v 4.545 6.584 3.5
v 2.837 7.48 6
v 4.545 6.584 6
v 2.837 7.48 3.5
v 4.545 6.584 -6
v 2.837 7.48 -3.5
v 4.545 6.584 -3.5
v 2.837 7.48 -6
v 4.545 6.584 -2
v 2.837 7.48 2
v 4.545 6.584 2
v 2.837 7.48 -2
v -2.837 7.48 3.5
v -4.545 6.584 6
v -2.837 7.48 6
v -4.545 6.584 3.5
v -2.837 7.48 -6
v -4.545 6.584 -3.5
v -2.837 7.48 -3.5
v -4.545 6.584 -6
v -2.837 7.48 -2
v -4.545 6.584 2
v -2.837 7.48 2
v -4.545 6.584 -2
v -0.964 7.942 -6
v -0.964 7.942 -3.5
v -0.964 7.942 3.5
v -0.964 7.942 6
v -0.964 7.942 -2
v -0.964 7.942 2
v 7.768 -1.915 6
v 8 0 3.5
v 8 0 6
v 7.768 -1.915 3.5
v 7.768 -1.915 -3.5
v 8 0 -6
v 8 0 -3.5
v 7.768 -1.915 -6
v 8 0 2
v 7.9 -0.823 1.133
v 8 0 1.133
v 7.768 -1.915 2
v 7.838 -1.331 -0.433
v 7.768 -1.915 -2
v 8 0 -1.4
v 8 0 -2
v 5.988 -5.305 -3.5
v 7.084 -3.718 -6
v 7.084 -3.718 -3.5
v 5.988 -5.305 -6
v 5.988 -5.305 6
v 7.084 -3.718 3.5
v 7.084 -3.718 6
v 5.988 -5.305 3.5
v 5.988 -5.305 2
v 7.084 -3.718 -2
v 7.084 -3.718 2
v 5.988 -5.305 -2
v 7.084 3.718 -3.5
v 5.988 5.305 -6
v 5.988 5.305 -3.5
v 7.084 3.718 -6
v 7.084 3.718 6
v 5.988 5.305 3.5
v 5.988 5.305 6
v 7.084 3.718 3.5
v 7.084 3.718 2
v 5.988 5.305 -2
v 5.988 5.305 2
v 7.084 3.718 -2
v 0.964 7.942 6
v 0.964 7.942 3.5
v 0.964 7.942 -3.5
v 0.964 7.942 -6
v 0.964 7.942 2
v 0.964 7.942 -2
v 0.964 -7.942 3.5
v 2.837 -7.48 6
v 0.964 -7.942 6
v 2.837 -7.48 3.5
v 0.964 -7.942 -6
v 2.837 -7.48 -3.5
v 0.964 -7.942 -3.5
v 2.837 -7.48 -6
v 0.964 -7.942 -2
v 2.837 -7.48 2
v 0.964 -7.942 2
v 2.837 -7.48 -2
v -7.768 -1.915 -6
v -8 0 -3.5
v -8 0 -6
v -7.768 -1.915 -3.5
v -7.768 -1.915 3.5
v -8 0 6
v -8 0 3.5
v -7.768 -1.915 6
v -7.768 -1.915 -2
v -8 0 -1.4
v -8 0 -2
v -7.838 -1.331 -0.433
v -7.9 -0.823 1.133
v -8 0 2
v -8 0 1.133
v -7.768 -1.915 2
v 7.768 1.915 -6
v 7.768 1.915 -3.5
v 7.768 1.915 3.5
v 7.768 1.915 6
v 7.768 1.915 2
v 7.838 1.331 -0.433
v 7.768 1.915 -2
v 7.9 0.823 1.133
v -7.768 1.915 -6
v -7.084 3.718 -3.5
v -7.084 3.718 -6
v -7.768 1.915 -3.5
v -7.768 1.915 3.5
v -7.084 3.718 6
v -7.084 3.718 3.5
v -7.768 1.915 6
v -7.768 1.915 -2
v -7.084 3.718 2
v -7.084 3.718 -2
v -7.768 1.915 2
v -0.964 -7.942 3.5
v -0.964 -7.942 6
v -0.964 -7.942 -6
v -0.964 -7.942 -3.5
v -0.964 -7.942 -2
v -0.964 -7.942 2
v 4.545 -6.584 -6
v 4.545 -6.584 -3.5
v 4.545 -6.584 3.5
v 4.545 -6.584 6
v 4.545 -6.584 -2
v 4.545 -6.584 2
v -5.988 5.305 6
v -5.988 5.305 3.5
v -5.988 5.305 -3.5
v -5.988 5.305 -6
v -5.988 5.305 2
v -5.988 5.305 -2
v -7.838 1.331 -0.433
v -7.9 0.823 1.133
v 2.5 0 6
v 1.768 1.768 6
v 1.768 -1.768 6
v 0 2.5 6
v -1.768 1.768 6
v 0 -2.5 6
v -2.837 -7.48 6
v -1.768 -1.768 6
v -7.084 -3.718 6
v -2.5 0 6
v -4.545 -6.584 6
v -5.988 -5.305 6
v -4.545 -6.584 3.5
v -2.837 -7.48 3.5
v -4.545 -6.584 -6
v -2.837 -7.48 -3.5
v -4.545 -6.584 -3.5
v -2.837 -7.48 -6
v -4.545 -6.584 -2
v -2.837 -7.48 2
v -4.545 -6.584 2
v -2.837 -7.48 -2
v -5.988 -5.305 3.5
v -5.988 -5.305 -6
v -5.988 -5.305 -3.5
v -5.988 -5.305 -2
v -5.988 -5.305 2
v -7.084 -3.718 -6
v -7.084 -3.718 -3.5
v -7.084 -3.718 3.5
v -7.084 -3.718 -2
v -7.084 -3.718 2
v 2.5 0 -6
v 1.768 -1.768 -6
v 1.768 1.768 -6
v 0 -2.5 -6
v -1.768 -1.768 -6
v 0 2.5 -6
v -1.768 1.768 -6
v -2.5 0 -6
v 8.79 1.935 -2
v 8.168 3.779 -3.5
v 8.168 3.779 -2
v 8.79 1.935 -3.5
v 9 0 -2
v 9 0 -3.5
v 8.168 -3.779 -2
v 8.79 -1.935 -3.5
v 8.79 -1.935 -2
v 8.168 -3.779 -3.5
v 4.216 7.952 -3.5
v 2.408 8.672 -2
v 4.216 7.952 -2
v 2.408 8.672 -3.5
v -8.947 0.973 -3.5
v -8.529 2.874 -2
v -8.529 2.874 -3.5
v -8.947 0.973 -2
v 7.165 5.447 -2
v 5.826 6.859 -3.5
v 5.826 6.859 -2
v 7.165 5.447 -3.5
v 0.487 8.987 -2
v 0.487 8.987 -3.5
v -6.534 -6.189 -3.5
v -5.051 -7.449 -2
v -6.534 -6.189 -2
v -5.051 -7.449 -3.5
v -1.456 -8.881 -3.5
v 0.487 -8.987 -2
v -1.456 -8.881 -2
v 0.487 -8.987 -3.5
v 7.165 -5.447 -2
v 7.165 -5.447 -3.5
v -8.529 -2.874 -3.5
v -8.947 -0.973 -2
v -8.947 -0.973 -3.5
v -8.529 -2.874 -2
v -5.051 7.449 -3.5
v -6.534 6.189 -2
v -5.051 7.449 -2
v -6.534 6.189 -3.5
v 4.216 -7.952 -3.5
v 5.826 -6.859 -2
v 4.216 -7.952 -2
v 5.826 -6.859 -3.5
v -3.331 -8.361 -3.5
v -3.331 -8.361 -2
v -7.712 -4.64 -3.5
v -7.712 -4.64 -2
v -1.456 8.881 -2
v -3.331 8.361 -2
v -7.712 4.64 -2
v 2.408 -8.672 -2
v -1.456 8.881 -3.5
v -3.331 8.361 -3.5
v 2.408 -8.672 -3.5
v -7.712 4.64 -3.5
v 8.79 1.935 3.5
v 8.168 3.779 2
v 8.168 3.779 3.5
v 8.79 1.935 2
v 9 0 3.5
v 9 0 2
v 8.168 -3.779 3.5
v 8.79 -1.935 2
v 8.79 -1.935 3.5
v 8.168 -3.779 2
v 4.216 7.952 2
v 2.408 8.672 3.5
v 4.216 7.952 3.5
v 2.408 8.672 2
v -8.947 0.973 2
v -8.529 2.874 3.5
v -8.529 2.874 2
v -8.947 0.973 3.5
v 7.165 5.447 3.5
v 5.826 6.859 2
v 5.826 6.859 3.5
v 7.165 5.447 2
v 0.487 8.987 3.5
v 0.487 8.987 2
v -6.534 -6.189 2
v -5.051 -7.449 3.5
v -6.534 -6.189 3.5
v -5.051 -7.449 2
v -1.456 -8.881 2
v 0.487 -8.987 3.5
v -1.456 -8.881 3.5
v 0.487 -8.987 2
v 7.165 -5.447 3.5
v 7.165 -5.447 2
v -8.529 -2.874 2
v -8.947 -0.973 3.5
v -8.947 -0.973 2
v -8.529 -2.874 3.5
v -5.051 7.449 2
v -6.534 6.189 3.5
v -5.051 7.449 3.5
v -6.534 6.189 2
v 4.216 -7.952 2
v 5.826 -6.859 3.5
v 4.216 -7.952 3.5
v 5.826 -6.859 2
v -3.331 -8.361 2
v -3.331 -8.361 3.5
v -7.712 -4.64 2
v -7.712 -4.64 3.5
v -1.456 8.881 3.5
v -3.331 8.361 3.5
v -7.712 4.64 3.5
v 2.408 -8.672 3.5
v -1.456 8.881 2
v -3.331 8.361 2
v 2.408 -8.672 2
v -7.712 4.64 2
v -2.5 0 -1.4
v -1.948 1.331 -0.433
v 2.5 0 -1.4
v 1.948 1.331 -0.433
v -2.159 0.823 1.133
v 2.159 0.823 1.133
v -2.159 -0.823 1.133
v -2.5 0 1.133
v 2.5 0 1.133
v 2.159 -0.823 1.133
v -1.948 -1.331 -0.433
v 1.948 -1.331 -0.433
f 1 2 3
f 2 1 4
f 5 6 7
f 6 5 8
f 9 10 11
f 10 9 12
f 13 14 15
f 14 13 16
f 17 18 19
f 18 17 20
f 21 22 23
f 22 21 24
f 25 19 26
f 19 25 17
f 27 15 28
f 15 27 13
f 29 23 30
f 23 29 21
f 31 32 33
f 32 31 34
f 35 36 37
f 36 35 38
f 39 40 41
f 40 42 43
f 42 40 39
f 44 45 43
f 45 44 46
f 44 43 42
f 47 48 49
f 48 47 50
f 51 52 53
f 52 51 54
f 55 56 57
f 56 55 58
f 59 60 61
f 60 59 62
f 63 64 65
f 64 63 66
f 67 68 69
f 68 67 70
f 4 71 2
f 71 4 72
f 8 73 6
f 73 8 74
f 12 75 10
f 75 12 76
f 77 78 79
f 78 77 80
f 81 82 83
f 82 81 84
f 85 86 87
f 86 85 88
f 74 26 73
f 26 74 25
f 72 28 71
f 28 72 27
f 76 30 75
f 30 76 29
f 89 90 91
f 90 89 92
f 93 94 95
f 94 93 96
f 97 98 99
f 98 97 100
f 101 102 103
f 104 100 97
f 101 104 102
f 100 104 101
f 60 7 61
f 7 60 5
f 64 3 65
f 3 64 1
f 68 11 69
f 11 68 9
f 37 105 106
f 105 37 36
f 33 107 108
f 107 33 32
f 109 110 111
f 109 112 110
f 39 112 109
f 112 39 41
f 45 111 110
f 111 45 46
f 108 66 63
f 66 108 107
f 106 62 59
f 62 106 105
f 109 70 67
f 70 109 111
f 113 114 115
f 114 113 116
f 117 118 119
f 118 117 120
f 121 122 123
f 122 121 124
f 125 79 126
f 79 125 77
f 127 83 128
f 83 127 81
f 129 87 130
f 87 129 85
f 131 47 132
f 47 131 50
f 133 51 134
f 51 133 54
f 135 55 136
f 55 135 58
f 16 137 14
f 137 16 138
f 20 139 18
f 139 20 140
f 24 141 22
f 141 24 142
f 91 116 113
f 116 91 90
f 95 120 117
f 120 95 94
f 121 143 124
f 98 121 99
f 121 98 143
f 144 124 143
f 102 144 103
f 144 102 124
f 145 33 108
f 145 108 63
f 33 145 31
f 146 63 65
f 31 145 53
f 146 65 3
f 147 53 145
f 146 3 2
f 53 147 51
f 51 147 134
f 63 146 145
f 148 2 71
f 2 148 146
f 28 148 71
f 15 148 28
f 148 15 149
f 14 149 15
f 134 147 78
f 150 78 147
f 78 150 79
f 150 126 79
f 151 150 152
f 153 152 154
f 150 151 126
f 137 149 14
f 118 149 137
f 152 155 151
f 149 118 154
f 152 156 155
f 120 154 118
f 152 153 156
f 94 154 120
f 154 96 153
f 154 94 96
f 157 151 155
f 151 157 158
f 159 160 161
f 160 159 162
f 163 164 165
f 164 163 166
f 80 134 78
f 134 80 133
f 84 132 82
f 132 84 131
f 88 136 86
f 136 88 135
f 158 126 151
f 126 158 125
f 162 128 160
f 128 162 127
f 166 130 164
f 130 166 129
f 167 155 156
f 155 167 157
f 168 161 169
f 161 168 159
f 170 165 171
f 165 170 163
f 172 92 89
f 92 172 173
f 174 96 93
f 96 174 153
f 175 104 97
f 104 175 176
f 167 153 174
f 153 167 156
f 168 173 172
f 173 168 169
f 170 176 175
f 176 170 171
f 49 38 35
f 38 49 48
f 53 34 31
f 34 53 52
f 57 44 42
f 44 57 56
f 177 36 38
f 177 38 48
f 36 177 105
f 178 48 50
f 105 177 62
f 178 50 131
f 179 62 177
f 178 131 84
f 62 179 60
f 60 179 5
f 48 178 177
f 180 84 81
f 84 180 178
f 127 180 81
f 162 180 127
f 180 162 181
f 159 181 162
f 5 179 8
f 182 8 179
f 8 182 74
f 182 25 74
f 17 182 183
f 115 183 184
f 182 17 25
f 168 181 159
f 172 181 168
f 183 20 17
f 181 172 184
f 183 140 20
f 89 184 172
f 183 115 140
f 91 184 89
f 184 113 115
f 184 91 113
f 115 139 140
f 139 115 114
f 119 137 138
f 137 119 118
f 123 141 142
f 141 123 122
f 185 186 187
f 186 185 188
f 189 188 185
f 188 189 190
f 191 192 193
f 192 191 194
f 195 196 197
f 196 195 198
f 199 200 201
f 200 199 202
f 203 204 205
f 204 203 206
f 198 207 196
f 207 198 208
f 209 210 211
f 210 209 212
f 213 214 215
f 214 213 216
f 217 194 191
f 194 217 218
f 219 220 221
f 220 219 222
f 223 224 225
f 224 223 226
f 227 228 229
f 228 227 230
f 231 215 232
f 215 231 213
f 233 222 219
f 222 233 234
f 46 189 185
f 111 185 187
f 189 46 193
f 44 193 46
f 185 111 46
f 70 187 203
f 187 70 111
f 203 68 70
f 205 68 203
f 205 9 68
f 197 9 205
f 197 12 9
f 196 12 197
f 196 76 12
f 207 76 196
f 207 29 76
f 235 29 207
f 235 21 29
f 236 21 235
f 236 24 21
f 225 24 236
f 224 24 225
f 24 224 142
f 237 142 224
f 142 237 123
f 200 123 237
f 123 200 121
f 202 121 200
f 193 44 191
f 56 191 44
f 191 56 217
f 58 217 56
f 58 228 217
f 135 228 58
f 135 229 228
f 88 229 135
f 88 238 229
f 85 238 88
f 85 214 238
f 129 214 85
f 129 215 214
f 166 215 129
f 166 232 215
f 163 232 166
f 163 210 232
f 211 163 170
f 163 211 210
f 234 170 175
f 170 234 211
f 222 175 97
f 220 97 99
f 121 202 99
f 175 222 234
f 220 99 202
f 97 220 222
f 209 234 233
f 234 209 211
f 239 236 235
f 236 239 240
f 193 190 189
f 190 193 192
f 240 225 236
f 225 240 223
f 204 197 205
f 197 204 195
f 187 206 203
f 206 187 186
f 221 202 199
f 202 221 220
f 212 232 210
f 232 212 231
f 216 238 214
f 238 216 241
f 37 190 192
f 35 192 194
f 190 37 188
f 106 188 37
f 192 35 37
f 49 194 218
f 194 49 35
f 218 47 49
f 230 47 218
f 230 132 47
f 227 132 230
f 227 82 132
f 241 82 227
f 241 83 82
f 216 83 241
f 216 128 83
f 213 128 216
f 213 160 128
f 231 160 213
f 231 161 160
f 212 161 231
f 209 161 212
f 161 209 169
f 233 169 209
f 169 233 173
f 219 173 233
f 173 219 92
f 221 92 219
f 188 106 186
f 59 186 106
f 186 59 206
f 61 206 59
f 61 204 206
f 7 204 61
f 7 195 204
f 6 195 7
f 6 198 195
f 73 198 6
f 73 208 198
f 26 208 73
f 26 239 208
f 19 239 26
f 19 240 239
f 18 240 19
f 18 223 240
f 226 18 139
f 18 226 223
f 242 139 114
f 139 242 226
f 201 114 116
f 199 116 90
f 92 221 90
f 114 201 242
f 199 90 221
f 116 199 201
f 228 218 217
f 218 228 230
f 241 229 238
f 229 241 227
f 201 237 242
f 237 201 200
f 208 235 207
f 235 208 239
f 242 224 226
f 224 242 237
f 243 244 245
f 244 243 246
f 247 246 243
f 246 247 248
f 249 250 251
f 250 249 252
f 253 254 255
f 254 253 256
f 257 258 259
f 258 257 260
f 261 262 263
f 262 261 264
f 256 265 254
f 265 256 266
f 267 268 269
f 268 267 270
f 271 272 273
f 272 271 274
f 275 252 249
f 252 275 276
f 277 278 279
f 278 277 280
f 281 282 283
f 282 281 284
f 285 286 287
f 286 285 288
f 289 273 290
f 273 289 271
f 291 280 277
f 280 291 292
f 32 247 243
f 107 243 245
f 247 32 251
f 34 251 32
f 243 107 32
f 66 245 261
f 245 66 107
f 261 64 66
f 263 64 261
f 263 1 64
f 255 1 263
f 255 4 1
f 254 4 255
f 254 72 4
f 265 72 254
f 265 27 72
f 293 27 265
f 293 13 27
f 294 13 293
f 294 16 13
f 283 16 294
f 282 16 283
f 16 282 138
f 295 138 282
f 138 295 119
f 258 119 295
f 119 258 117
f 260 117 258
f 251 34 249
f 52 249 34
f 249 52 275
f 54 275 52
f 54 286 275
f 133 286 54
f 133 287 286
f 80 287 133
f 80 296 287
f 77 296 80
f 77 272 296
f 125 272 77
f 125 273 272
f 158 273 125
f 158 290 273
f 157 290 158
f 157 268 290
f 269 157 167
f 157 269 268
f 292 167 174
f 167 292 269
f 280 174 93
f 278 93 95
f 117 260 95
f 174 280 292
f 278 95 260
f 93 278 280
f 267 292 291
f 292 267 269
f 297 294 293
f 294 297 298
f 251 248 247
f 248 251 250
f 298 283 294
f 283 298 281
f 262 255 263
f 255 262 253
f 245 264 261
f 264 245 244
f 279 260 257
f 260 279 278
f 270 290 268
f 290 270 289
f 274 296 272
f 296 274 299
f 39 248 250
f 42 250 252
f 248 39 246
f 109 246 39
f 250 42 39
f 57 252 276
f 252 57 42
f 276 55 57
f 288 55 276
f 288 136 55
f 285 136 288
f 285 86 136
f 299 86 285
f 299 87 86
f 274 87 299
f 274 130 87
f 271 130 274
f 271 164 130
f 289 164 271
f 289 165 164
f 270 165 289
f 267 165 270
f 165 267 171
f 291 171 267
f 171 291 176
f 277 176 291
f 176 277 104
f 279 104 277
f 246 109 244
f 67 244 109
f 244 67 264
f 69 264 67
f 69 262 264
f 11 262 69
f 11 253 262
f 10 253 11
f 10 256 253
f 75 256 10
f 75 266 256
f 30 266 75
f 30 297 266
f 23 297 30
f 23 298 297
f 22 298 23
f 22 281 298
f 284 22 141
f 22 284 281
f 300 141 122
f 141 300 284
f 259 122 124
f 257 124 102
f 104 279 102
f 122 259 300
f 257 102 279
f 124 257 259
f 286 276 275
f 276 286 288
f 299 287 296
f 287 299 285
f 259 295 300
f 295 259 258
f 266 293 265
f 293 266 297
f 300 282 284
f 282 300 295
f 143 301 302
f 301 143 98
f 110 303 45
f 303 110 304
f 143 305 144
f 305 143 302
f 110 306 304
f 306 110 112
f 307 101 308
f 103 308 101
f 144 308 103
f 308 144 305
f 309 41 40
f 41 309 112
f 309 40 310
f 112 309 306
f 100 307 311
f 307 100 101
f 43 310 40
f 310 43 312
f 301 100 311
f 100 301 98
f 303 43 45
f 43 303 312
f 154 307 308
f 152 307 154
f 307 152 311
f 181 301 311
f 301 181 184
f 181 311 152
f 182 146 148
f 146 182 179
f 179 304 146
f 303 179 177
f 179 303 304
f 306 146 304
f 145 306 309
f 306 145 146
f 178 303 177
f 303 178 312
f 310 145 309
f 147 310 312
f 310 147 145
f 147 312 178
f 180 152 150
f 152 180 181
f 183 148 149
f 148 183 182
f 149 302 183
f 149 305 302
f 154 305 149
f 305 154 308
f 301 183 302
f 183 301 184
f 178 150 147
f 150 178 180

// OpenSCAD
// Parameters
tooth_count = 20; //[10:60:1]
pitch_diameter_mm = 12.22; //[6.11:24.44:0.01]
belt_pitch_mm = 2; //[1:5:0.01]
belt_width_mm = 6; //[3:15:0.5]
tooth_depth_mm = 0.75; //[0.4:1.5:0.01]
tooth_tip_radius_mm = 0.55; //[0.3:1.0:0.01]
tooth_root_radius_mm = 0.35; //[0.2:0.8:0.01]
bore_diameter_mm = 5; //[2:10:0.01]
hub_diameter_mm = 16; //[10:32:0.1]
hub_length_mm = 12; //[6:24:0.1]
flange_diameter_mm = 18; //[12:36:0.1]
flange_thickness_mm = 1.5; //[0.8:4:0.1]
set_screw_count = 2; //[0:4:1]
set_screw_hole_diameter_mm = 2.8; //[2:6:0.01]
set_screw_z_mm = 6; //[1:20:0.1]
overlap_mm = 1; //[0.5:2:0.1]
radial_clearance_mm = 0.2; //[0:0.6:0.01]

// Pulley Body
module pulley_body() {
  color("Silver") {
    cylinder(h=belt_width_mm, r=pitch_diameter_mm/2 - tooth_depth_mm - radial_clearance_mm, center=true);
  }
}

// Hub
module hub() {
  color("Silver") {
    cylinder(h=hub_length_mm, r=hub_diameter_mm/2, center=true);
  }
}

// Flanges
module flange_bottom() {
  color("Silver") {
    translate([0, 0, -belt_width_mm/2 - flange_thickness_mm/2 + overlap_mm])
      cylinder(h=flange_thickness_mm, r=flange_diameter_mm/2, center=true);
  }
}

module flange_top() {
  color("Silver") {
    translate([0, 0, belt_width_mm/2 + flange_thickness_mm/2 - overlap_mm])
      cylinder(h=flange_thickness_mm, r=flange_diameter_mm/2, center=true);
  }
}

// Bore
module bore() {
  cylinder(h=hub_length_mm + 2*flange_thickness_mm + 2*overlap_mm, r=bore_diameter_mm/2, center=true);
}

// Printed Pulley GT2 Teeth
module printed_pulley_GT2_teeth() {
  hull() {
    translate([pitch_diameter_mm/2 - tooth_depth_mm + tooth_tip_radius_mm - overlap_mm, 0, 0])
      cylinder(h=belt_width_mm, r=tooth_tip_radius_mm, center=true);
    translate([pitch_diameter_mm/2 - tooth_depth_mm + 2*tooth_tip_radius_mm - overlap_mm, 0, 0])
      cube([2*tooth_tip_radius_mm, belt_pitch_mm/2, belt_width_mm], center=true);
  }
}

// Printed Pulley Teeth From Profile
module printed_pulley_teeth_from_profile() {
  hull() {
    translate([pitch_diameter_mm/2 - tooth_depth_mm - tooth_root_radius_mm + overlap_mm, 0, 0])
      cylinder(h=belt_width_mm, r=tooth_root_radius_mm, center=true);
    translate([pitch_diameter_mm/2 - tooth_depth_mm - 2*tooth_root_radius_mm + overlap_mm, 0, 0])
      cube([2*tooth_root_radius_mm, belt_pitch_mm/2, belt_width_mm], center=true);
  }
}

// Printed Pulley Teeth
module printed_pulley_teeth() {
  union() {
    printed_pulley_GT2_teeth();
    printed_pulley_teeth_from_profile();
  }
}

// Tooth Ring
module tooth_ring() {
  for (i = [0:tooth_count-1]) {
    rotate([0, 0, i*360/tooth_count])
      printed_pulley_teeth();
  }
}

// Set Screw Holes
module set_screw_holes() {
  if (set_screw_count > 0) {
    for (i = [0:set_screw_count-1]) {
      rotate([0, 0, i*360/set_screw_count])
        translate([0, 0, -hub_length_mm/2 + set_screw_z_mm])
          rotate([0, 90, 0])
            cylinder(h=hub_diameter_mm + 2*overlap_mm, r=set_screw_hole_diameter_mm/2, center=true);
    }
  }
}

// Pulley Assembly
module pulley() {
  difference() {
    union() {
      pulley_body();
      hub();
      flange_bottom();
      flange_top();
      tooth_ring();
    }
    bore();
    set_screw_holes();
  }
}

// Final Assembly
module assembly() {
  pulley();
}

assembly();
